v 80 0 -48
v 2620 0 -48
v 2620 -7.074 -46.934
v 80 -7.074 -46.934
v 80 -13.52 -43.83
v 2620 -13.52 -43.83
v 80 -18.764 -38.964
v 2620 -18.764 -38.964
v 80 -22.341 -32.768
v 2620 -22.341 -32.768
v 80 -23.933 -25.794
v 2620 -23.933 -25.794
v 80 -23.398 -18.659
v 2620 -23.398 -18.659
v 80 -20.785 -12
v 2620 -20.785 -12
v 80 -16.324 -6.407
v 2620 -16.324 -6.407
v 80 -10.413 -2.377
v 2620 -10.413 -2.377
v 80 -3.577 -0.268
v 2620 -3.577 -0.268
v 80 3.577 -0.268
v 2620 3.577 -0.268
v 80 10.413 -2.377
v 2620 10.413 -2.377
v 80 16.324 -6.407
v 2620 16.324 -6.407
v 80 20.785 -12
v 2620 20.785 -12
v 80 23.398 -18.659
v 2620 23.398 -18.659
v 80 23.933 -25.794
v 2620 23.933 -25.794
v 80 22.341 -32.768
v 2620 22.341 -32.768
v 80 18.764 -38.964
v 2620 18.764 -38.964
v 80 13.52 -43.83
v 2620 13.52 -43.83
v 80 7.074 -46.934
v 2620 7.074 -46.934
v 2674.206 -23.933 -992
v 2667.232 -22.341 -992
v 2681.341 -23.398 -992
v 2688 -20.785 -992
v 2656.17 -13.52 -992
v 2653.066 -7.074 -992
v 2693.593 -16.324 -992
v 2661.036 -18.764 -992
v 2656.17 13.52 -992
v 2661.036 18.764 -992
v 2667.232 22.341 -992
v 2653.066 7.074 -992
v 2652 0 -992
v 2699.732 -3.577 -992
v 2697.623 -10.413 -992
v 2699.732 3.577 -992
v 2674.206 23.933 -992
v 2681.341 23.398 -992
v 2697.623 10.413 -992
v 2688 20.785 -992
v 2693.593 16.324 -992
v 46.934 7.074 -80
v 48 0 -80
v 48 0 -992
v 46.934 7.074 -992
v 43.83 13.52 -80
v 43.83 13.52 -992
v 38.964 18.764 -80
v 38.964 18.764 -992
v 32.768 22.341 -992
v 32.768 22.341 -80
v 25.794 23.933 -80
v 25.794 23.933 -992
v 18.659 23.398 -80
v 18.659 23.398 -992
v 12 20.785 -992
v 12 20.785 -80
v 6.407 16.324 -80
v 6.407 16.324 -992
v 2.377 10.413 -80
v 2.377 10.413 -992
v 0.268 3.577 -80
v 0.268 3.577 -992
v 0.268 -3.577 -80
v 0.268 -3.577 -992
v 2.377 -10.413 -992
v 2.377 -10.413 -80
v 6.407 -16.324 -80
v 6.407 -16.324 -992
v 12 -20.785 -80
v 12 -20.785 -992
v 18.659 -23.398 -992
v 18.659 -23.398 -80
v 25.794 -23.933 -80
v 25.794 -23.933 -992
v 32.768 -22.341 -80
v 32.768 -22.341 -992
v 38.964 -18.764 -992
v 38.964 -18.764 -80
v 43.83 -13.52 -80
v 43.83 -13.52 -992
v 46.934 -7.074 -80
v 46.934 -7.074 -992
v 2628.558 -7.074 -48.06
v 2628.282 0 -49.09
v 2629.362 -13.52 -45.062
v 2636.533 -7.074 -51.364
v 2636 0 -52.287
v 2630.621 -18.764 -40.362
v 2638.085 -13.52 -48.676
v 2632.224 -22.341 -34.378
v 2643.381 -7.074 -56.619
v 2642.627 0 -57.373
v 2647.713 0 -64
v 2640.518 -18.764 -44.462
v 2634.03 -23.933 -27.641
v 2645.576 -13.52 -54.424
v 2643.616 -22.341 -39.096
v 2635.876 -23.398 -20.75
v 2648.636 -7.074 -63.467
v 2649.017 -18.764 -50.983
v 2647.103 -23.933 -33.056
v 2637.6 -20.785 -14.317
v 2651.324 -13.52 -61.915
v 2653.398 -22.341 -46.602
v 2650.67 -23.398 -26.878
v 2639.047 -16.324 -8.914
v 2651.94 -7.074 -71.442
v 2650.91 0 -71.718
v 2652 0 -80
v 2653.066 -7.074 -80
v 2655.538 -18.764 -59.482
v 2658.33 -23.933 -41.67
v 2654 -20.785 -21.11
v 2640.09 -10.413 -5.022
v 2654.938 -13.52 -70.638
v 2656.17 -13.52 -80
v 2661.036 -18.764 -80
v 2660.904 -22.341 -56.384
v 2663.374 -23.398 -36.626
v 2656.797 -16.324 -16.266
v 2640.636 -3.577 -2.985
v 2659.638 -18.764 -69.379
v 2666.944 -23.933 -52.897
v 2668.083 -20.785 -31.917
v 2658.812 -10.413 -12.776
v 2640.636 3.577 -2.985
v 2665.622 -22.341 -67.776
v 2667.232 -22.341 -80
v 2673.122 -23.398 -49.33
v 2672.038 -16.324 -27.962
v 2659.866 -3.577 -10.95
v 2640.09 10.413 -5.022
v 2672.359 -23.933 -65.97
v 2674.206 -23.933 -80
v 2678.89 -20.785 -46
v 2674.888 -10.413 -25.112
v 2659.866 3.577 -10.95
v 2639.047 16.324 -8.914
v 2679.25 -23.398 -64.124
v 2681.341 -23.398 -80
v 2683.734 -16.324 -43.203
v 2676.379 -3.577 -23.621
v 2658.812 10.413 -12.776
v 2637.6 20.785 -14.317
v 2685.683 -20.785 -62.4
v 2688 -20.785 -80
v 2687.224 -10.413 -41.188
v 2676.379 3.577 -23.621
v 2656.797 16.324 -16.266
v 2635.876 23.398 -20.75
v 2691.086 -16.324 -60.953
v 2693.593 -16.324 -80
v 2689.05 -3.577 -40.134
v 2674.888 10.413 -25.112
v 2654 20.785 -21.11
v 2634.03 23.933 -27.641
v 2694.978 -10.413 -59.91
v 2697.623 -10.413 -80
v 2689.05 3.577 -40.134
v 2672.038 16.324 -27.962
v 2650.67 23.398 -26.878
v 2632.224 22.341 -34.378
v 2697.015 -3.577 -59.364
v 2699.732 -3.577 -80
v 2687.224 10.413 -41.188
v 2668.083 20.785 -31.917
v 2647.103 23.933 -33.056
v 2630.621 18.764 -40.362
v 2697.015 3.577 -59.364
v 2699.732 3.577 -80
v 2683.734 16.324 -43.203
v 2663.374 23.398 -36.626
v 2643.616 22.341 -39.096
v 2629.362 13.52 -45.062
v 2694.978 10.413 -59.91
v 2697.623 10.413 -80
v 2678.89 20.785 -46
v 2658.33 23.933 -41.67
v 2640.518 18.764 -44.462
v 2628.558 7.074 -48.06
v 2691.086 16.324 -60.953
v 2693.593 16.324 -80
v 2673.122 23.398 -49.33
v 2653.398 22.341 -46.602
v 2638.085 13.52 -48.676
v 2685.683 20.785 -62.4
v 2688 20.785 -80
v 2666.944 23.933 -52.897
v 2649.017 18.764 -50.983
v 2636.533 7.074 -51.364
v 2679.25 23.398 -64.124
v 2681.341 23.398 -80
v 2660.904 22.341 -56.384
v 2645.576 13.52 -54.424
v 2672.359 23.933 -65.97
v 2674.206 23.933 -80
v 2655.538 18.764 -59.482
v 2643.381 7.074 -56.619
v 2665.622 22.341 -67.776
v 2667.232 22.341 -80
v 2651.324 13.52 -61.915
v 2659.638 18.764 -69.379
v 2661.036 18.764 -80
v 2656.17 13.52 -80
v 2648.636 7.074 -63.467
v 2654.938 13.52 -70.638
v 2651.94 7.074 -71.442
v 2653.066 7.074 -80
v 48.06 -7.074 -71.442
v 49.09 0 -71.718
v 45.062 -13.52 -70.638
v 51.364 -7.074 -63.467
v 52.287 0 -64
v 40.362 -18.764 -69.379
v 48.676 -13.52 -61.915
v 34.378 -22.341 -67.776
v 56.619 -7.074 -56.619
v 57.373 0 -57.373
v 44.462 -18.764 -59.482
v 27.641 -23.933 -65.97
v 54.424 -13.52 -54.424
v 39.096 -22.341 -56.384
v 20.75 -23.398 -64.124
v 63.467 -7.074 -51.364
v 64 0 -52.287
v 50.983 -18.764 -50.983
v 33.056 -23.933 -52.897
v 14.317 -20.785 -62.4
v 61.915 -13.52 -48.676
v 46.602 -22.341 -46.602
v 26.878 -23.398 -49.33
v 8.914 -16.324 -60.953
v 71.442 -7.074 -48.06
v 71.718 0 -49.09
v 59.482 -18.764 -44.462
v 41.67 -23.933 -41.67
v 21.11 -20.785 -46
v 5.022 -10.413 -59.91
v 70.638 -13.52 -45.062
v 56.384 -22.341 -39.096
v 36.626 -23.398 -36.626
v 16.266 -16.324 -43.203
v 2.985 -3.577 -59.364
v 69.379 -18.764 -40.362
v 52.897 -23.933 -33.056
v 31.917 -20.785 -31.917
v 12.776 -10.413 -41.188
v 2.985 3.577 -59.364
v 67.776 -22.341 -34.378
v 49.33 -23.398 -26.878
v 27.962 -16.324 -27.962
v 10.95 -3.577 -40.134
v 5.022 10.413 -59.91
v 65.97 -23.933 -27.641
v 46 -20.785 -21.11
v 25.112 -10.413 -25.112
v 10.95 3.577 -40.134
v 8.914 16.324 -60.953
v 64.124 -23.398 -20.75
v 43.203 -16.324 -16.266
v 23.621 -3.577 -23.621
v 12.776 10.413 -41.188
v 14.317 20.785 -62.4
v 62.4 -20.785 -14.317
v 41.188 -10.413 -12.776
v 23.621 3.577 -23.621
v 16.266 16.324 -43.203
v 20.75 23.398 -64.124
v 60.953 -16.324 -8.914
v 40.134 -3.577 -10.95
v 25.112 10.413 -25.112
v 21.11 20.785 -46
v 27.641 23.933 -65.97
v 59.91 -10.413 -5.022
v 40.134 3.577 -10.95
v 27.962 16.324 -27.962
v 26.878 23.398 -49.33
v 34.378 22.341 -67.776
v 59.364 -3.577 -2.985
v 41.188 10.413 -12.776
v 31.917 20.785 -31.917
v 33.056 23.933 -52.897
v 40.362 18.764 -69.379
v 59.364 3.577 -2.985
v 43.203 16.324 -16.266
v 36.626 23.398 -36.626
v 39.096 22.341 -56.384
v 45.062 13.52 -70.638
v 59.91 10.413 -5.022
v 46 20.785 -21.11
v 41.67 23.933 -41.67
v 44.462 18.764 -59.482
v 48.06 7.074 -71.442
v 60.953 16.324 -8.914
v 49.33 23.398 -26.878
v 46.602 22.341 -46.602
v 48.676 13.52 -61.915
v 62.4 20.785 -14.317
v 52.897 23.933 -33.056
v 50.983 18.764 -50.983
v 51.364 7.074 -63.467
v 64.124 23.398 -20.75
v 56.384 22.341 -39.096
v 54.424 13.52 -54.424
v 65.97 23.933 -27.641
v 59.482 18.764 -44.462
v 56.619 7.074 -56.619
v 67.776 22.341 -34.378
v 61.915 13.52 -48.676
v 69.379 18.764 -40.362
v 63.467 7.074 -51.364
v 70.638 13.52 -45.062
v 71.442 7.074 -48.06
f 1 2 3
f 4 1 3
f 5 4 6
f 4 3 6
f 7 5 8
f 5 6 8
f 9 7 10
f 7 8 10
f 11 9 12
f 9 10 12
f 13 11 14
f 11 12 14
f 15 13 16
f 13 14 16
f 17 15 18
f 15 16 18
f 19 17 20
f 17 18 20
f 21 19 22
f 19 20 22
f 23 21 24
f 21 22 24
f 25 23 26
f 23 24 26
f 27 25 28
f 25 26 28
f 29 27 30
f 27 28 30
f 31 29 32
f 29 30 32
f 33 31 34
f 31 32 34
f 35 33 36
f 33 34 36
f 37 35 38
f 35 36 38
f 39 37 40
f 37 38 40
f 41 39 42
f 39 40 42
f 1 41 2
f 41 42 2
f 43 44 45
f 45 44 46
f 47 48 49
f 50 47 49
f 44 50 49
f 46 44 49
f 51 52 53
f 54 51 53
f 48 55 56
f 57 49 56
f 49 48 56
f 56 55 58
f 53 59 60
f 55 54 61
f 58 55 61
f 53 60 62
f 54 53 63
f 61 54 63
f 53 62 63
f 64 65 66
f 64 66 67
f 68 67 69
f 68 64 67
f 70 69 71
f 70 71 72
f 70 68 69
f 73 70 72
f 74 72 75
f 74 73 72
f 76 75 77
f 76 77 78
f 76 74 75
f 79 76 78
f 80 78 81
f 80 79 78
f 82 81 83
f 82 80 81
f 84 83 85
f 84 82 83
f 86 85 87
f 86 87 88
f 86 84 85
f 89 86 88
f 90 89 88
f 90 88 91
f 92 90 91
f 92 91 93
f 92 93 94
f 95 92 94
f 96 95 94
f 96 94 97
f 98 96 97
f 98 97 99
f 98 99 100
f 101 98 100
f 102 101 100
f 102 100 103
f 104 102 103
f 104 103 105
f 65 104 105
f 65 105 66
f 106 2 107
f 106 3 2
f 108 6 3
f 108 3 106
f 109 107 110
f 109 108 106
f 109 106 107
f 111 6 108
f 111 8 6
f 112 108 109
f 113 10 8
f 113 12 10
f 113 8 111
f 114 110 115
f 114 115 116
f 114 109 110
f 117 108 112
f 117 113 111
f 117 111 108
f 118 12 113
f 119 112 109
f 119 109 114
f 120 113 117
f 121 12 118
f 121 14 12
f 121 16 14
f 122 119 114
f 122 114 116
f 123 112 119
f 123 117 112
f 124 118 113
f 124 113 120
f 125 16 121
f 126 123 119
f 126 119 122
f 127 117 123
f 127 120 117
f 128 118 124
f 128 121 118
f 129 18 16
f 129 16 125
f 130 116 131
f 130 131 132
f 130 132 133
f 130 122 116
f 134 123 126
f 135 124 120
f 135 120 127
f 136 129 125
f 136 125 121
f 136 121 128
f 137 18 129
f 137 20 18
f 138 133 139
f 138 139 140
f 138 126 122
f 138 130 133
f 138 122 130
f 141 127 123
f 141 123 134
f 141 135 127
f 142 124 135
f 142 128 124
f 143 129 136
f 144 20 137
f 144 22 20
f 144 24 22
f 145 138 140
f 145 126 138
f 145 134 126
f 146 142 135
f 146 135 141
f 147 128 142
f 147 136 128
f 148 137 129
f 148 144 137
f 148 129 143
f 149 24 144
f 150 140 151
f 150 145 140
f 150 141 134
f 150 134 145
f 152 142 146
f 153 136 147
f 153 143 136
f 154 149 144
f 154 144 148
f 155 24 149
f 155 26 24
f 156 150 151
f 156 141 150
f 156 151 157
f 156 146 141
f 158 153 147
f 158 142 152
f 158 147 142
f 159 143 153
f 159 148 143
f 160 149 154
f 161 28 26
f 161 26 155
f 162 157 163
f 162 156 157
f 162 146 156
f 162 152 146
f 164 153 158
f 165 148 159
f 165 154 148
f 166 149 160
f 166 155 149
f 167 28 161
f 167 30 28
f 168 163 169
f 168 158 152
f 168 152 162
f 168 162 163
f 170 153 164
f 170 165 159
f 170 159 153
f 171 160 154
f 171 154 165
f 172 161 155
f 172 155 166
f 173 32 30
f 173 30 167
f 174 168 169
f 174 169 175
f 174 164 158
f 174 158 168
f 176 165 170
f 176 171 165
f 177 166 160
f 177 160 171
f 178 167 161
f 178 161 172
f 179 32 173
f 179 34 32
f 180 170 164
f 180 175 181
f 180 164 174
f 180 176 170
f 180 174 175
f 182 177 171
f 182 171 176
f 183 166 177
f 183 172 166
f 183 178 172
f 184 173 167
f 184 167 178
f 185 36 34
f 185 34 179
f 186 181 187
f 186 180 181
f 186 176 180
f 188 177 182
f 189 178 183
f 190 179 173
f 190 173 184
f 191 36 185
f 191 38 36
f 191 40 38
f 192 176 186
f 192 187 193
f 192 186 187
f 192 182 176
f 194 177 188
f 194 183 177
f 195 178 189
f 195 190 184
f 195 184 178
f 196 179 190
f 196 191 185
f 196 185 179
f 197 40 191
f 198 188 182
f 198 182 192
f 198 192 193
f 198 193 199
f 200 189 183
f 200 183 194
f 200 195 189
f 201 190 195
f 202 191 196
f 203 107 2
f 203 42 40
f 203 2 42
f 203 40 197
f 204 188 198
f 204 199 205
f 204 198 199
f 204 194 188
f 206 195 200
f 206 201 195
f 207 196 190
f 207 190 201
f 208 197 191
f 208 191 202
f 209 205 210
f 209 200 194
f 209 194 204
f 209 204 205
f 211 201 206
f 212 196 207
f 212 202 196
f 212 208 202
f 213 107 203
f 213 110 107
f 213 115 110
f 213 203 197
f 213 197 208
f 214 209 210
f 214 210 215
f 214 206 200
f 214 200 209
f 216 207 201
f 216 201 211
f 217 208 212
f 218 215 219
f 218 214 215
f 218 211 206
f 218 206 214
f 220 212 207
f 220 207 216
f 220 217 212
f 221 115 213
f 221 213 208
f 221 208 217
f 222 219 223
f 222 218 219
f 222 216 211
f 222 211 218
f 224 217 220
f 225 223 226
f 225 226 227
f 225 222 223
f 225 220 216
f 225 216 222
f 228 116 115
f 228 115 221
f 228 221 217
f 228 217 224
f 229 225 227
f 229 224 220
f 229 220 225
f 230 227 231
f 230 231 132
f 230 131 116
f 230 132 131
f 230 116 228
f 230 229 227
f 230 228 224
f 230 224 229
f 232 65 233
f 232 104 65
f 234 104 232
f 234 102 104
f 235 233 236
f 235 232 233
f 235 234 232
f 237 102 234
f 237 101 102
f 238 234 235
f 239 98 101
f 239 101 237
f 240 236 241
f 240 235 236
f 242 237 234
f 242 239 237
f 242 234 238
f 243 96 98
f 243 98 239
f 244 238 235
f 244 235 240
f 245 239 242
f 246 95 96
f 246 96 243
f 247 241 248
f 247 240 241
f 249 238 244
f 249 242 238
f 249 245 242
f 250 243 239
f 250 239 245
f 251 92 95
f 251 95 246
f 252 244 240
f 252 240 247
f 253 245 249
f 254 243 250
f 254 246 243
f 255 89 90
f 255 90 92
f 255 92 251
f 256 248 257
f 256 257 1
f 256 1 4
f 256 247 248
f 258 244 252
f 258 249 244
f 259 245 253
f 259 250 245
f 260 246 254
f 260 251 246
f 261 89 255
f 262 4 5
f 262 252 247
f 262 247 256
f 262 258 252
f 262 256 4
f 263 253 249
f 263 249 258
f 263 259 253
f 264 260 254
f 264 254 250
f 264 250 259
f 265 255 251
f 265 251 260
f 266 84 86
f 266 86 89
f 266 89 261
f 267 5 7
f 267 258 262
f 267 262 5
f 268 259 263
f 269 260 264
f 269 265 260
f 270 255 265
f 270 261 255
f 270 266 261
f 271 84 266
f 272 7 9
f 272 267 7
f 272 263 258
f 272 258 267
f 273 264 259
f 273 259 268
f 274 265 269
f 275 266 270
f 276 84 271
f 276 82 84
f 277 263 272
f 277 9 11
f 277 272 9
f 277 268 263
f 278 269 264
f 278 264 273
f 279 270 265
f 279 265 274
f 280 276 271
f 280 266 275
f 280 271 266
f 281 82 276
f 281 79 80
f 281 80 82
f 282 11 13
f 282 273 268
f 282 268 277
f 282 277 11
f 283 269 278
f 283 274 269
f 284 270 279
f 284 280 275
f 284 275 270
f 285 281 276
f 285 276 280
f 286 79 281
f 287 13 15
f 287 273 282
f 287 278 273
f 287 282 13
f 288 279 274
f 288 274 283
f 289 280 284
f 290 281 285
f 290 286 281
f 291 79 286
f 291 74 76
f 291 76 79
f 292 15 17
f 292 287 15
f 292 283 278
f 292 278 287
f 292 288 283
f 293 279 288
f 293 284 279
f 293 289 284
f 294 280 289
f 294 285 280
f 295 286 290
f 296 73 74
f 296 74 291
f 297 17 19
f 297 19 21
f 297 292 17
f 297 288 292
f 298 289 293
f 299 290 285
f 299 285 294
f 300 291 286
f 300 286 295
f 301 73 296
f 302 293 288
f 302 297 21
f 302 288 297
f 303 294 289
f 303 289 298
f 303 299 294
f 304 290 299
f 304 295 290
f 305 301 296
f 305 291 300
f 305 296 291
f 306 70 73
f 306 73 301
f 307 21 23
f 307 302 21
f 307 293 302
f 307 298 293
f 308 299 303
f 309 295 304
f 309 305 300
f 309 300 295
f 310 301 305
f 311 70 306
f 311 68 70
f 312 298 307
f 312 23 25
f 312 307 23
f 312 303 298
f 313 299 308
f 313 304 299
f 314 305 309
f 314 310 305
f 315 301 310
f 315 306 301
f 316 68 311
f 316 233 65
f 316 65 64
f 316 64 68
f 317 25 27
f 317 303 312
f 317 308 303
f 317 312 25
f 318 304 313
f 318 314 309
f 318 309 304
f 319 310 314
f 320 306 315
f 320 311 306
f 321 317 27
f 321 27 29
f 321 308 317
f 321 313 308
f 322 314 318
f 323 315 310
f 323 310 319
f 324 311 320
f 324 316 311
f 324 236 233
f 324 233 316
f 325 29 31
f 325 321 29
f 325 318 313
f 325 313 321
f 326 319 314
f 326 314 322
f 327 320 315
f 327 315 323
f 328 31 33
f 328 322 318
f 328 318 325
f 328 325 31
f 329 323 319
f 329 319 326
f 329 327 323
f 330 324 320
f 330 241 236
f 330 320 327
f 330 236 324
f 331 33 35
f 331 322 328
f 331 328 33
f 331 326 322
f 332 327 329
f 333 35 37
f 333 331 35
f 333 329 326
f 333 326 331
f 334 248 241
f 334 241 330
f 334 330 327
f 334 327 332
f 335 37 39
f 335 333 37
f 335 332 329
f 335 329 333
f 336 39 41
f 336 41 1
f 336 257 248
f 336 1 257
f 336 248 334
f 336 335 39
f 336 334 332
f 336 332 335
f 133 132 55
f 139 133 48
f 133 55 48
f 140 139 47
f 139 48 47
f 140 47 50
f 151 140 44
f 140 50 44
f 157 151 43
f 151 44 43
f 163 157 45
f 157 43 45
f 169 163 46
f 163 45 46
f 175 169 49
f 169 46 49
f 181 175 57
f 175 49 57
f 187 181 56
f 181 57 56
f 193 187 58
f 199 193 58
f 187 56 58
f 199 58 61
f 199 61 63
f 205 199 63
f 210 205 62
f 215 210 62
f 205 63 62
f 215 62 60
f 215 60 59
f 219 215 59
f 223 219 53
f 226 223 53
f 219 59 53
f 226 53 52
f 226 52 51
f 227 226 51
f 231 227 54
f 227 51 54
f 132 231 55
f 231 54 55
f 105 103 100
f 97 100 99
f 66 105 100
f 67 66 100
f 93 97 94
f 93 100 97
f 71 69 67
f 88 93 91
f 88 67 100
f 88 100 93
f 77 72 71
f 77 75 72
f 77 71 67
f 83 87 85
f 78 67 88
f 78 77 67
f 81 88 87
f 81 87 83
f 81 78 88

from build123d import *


with BuildPart() as f3:
    # F3: sweep along a path in F0
    with BuildLine(Plane.XZ) as f3_path:
        Line((0, -992), (0, -80))
        ThreePointArc((0, -80), (23.431458, -23.431458), (80, 0))
        Line((80, 0), (2620, 0))
        ThreePointArc((2620, 0), (2676.568542, -23.431458), (2700, -80))
        Line((2700, -80), (2700, -992))
    # F2 (on face) → F3 (sweep)
    with BuildSketch(Plane(origin=(0, 0, -992), x_dir=(1, 0, 0), z_dir=(0, 0, -1))):
        with BuildLine():
            ThreePointArc((0, 0), (24, -24), (48, 0))
            ThreePointArc((48, 0), (24, 24), (0, 0))
        make_face()
    sweep(path=f3_path.line)


solid = f3.part
